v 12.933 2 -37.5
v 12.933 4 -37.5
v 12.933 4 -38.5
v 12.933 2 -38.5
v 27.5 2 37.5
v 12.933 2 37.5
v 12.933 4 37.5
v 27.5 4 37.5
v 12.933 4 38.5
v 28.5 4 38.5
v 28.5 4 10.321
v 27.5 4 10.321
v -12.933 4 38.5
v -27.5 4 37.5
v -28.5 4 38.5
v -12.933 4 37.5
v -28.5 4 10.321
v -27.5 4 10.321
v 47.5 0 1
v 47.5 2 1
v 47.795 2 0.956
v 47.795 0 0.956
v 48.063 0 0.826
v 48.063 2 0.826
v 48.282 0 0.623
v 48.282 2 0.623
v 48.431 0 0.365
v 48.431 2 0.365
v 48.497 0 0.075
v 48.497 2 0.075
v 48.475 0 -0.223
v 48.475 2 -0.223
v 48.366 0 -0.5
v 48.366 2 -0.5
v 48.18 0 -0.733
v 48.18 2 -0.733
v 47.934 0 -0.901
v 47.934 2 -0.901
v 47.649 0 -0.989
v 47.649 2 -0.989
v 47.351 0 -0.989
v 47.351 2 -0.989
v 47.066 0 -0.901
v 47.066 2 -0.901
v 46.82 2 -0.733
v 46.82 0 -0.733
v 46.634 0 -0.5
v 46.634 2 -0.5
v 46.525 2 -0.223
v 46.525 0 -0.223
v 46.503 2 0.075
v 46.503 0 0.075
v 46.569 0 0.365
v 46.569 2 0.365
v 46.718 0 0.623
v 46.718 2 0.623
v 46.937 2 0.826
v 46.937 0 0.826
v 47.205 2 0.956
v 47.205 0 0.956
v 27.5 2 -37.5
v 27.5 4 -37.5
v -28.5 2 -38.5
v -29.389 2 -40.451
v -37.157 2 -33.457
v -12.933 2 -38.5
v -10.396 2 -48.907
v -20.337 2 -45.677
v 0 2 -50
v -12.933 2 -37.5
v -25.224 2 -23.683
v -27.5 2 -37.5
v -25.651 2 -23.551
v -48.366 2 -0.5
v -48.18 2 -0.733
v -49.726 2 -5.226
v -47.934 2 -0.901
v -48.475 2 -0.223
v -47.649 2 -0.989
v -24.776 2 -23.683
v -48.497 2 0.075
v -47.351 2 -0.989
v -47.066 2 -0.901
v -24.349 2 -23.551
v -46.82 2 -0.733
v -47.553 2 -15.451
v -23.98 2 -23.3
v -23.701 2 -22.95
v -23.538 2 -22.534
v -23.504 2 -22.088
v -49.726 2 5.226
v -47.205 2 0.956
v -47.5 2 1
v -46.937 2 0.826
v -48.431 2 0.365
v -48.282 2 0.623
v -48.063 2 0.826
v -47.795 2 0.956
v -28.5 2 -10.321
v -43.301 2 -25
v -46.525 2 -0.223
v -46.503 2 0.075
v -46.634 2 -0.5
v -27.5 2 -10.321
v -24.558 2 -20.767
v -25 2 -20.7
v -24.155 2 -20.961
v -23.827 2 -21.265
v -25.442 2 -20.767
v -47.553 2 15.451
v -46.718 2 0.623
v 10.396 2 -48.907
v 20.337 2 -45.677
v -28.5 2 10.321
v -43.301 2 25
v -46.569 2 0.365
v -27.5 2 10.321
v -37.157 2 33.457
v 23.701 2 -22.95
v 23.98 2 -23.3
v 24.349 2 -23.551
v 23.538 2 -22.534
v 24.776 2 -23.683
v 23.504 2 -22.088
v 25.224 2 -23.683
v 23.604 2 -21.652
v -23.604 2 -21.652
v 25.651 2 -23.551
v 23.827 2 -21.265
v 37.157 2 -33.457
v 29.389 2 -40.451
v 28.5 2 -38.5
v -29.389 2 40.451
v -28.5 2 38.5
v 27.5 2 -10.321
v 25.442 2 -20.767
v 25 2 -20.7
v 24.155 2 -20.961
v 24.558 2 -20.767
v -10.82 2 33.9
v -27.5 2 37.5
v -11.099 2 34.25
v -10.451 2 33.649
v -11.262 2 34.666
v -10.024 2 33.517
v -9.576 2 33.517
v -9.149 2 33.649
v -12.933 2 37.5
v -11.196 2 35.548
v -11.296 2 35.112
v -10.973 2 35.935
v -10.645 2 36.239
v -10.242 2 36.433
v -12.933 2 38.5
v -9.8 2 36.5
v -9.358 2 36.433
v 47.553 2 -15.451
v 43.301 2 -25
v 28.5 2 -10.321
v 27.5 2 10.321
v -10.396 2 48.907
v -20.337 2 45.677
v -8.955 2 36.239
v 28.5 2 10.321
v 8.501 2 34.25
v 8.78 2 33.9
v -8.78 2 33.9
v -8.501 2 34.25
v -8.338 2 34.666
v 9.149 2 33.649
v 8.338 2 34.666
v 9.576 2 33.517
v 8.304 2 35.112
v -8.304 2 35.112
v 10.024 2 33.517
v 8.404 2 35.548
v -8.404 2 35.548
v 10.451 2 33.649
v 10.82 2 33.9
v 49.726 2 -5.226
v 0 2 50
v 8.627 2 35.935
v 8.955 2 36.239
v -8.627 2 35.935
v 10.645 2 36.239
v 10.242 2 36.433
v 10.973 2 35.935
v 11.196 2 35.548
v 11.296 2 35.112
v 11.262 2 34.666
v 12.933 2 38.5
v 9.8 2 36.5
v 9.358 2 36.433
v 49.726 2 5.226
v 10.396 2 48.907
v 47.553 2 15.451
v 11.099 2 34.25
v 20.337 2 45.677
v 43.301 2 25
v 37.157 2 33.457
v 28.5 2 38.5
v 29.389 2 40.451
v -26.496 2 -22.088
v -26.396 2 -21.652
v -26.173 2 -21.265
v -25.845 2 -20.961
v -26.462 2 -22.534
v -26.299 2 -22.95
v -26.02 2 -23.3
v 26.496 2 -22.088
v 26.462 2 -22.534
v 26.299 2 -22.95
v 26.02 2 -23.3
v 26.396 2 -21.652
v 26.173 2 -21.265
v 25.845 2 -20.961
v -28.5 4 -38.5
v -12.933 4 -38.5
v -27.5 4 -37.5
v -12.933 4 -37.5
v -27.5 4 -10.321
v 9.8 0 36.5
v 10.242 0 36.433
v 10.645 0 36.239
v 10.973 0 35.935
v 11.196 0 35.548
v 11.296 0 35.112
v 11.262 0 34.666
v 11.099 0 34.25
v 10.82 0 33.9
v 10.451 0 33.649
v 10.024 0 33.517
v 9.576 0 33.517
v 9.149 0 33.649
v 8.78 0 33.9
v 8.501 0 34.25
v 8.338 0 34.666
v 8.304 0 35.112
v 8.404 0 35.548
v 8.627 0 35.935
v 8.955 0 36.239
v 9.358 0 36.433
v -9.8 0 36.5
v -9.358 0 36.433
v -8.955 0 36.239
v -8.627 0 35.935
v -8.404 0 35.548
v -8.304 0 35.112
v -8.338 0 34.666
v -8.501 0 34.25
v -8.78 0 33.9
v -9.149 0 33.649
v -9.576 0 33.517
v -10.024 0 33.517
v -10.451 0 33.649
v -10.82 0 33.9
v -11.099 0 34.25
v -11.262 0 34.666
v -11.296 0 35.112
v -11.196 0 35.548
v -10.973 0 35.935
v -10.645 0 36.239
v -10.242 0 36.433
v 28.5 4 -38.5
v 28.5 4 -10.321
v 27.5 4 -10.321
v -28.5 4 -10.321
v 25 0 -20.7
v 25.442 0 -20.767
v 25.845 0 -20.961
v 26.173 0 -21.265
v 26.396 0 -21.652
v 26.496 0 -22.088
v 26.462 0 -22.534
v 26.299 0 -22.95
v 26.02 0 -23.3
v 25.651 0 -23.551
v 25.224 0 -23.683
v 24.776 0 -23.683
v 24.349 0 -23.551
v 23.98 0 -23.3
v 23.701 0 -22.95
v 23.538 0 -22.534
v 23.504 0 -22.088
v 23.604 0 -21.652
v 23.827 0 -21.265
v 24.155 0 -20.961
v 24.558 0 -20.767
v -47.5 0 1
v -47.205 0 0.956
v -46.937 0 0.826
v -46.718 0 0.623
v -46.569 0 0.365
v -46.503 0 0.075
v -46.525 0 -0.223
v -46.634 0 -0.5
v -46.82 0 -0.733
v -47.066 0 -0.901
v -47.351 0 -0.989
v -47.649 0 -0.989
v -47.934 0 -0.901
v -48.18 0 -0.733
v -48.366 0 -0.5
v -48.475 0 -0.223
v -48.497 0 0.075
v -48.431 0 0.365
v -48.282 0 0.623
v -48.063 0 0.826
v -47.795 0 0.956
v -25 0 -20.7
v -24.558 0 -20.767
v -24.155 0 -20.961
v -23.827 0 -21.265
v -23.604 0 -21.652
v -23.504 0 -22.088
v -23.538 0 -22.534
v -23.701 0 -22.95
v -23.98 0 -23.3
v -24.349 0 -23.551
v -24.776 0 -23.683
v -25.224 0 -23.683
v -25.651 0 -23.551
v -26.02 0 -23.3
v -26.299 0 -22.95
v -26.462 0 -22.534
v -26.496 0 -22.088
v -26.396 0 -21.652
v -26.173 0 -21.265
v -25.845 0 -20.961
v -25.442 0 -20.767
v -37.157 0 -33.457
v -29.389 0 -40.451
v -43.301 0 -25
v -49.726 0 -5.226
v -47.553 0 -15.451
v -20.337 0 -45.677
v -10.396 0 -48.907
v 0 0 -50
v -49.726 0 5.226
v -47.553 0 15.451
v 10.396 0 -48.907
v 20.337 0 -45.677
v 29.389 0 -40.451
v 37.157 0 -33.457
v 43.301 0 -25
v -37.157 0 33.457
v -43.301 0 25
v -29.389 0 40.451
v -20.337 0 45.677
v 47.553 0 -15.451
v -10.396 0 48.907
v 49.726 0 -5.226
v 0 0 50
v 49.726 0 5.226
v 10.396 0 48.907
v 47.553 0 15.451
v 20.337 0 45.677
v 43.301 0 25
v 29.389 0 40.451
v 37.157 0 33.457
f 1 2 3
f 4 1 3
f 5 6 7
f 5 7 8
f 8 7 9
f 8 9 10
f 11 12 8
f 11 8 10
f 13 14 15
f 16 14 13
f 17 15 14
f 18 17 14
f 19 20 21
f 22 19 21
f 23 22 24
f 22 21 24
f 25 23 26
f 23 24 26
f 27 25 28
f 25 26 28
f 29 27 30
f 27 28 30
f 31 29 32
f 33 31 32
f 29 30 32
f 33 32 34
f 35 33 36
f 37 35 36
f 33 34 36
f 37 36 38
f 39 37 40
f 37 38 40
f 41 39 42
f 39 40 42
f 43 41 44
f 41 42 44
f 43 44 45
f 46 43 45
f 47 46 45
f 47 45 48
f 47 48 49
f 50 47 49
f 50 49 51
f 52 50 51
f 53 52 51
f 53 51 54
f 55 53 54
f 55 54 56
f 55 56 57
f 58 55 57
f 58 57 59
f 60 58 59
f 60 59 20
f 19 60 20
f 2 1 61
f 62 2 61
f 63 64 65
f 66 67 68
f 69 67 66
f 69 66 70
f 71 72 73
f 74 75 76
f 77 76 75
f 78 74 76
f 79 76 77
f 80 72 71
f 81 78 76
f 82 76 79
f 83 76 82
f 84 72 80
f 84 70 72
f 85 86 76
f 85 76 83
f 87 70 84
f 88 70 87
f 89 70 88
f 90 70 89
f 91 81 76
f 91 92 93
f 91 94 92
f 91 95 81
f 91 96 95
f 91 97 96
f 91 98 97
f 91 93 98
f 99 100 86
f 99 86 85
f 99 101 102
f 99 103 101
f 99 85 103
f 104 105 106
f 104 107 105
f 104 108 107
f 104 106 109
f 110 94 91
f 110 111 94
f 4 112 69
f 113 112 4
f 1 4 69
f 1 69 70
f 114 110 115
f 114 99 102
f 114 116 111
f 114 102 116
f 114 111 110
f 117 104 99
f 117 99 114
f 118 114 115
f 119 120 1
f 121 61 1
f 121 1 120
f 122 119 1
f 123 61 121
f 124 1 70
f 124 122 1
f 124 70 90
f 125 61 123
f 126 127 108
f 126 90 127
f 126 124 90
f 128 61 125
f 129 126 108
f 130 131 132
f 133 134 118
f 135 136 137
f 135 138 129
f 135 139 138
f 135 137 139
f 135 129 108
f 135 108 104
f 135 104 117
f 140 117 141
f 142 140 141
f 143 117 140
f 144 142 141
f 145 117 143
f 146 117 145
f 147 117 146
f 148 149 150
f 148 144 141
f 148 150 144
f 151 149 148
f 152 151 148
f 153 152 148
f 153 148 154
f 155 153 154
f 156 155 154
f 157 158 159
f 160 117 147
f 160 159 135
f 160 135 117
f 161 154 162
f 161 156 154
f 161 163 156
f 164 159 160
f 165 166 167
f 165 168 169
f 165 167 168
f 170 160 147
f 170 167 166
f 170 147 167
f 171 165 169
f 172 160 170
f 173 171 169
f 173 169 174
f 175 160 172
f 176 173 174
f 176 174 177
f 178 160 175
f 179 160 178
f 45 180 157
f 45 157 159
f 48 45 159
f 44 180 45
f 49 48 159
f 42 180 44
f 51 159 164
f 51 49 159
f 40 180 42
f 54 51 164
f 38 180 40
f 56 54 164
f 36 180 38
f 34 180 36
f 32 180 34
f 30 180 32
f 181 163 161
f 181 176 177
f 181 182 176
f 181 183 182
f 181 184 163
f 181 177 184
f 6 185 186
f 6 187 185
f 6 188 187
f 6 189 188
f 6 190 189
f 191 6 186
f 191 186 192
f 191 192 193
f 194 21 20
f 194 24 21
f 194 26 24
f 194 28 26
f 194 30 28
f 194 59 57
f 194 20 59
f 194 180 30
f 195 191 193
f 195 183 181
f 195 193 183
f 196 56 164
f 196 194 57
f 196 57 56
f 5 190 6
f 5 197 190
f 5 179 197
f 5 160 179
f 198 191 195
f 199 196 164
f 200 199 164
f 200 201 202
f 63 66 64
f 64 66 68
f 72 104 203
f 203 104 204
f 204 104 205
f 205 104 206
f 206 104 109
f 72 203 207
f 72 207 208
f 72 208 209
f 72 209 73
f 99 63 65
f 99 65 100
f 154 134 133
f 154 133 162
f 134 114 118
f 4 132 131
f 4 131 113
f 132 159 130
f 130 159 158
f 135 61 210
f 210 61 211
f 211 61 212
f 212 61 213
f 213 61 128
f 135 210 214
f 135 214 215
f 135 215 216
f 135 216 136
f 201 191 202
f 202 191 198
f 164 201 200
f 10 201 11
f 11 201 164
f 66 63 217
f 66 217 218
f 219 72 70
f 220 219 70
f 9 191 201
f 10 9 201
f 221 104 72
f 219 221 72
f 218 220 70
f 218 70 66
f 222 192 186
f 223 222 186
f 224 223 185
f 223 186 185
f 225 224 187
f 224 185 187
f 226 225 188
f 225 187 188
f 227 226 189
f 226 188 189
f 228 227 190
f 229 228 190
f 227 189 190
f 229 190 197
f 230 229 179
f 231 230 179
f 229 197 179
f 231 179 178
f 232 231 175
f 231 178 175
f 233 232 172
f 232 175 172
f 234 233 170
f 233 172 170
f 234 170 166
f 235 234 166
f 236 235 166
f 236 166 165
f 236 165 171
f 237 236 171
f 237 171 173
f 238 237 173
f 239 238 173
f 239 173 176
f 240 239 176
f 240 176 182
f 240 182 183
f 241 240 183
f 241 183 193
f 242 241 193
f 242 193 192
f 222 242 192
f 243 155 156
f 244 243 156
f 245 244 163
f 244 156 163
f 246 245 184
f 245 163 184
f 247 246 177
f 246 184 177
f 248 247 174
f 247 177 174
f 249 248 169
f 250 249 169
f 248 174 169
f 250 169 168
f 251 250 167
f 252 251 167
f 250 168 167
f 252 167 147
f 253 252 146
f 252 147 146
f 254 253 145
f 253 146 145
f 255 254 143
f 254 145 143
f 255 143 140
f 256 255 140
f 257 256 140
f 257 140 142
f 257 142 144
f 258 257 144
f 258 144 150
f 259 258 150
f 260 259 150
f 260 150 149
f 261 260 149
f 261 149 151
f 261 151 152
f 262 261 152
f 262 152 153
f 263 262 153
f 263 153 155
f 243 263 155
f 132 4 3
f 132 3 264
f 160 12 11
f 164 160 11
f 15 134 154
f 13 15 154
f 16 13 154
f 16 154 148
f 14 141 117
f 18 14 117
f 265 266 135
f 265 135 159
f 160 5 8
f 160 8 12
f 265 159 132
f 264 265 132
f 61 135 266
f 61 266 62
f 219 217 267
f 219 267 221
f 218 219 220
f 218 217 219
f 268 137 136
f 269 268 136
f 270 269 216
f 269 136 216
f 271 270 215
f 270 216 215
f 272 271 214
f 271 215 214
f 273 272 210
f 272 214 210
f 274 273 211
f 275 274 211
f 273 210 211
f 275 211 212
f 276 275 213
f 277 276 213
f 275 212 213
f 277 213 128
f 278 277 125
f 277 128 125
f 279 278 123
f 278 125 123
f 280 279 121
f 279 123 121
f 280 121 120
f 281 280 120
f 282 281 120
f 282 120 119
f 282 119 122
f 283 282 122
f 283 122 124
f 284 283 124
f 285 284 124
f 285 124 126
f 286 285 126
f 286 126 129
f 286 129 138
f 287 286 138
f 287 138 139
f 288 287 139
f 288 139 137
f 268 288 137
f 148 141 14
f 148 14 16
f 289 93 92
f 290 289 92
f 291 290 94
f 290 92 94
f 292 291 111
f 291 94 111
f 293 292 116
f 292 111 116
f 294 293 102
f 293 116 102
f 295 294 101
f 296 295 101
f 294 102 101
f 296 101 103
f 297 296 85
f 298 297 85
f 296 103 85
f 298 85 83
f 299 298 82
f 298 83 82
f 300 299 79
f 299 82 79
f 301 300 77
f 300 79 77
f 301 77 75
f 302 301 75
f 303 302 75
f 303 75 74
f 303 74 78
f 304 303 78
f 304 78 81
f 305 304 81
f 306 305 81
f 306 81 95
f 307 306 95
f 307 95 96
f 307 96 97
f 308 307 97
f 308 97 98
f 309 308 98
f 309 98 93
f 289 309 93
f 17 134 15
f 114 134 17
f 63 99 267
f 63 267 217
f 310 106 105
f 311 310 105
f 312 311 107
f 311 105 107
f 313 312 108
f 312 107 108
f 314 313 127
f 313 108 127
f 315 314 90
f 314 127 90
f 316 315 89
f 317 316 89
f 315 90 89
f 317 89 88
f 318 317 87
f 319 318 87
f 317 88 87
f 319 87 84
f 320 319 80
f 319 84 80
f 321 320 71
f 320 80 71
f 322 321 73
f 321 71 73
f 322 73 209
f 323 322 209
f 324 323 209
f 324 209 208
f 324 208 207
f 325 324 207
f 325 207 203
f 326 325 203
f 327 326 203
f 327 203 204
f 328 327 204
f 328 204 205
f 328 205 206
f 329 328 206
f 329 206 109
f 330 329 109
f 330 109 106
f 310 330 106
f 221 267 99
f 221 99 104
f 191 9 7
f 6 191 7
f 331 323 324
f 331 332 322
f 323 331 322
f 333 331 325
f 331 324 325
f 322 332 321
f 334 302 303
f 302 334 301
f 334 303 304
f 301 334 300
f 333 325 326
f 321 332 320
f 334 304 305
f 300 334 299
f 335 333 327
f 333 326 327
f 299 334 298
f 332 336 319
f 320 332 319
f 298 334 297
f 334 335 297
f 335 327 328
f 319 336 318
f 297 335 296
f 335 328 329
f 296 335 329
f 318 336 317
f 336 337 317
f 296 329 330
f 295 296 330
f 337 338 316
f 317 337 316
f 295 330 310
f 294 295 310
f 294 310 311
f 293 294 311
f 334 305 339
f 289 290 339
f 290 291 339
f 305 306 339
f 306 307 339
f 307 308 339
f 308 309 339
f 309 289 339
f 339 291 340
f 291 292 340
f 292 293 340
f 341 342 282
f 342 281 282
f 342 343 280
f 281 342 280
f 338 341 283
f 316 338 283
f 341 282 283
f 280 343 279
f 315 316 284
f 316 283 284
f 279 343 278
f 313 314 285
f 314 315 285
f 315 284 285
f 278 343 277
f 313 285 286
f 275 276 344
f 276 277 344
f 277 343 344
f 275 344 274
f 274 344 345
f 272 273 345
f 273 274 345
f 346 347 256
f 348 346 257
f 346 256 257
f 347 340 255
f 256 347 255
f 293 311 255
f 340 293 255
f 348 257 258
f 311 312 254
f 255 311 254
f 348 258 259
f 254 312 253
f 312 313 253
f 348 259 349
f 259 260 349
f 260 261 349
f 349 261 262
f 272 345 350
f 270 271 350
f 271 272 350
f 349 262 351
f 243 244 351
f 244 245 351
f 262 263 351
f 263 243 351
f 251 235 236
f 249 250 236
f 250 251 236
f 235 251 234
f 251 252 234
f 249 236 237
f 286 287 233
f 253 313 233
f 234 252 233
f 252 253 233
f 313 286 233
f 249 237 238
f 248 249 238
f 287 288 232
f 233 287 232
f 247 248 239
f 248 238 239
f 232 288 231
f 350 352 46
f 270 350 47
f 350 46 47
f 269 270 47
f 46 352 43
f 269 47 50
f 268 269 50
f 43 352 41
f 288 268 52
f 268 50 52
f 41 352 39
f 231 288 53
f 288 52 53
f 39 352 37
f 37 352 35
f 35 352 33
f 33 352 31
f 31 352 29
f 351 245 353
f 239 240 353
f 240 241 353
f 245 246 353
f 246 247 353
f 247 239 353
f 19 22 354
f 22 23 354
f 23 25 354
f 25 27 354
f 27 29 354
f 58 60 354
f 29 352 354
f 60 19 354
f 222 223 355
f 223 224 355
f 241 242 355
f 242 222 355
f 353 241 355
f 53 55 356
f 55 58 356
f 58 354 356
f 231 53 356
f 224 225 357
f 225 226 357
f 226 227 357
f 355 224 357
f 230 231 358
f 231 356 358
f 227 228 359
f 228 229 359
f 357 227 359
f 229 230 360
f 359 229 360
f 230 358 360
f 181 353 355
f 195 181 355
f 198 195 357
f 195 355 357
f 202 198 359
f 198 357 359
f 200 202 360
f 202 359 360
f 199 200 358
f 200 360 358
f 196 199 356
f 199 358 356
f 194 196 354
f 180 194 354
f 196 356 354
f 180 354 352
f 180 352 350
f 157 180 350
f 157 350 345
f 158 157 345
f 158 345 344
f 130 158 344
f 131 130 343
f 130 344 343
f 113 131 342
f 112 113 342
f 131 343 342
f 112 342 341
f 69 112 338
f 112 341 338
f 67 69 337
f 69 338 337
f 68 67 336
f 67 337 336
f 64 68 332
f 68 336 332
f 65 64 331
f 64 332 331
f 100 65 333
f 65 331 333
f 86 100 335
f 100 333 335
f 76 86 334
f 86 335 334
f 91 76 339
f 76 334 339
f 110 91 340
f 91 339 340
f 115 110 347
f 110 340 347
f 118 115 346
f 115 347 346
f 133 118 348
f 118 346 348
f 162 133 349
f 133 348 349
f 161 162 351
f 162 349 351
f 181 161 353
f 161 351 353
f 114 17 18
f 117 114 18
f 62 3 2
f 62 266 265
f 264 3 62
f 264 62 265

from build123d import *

# Parameters (mm, degrees)
SKETCH1_R           = 50
BOSS_EXTRUDE3_DEPTH = 2
SKETCH3_W           = 57
SKETCH3_H           = 77
SKETCH3_W_2         = 55
SKETCH3_H_2         = 75
BOSS_EXTRUDE4_DEPTH = 2
SKETCH4_W           = 84.733719196
SKETCH4_H           = 20.64189851
CUT_EXTRUDE1_DEPTH  = 2
SKETCH5_W           = 25.866082702
SKETCH5_H           = 94.035315438
CUT_EXTRUDE2_DEPTH  = 2
SKETCH6_R           = 1.5
CUT_EXTRUDE3_DEPTH  = 12
SKETCH7_R           = 1
CUT_EXTRUDE4_DEPTH  = 10.15


with BuildPart() as part:
    # Sketch1 → Boss-Extrude3 (new body)
    with BuildSketch(Plane(origin=(0, 0, 0), x_dir=(1, 0, 0), z_dir=(0, 1, 0))):
        with Locations(Location((0, 0, 0), (0, 0, 270))):
            Circle(SKETCH1_R)
    extrude(amount=BOSS_EXTRUDE3_DEPTH)

    # Sketch3 → Boss-Extrude4 (add)
    with BuildSketch(Plane(origin=(0, 2, 0), x_dir=(1, 0, 0), z_dir=(0, 1, 0))):
        Rectangle(SKETCH3_W, SKETCH3_H)
        Rectangle(SKETCH3_W_2, SKETCH3_H_2, mode=Mode.SUBTRACT)
    extrude(amount=BOSS_EXTRUDE4_DEPTH)

    # Sketch4 → Cut-Extrude1 (cut)
    with BuildSketch(Plane(origin=(0, 4, 0), x_dir=(1, 0, 0), z_dir=(0, 1, 0))):
        Rectangle(SKETCH4_W, SKETCH4_H)
    extrude(amount=-CUT_EXTRUDE1_DEPTH, mode=Mode.SUBTRACT)

    # Sketch5 → Cut-Extrude2 (cut)
    with BuildSketch(Plane(origin=(0, 4, 0), x_dir=(1, 0, 0), z_dir=(0, 1, 0))):
        Rectangle(SKETCH5_W, SKETCH5_H)
    extrude(amount=-CUT_EXTRUDE2_DEPTH, mode=Mode.SUBTRACT)

    # Sketch6 → Cut-Extrude3 (cut)
    with BuildSketch(Plane(origin=(0, 2, 0), x_dir=(1, 0, 0), z_dir=(0, 1, 0))):
        with Locations(Location((25, 22.2, 0), (0, 0, 270))):
            Circle(SKETCH6_R)
        with Locations(Location((-25, 22.2, 0), (0, 0, 270))):
            Circle(SKETCH6_R)
        with Locations(Location((9.8, -35, 0), (0, 0, 270))):
            Circle(SKETCH6_R)
        with Locations(Location((-9.8, -35, 0), (0, 0, 270))):
            Circle(SKETCH6_R)
    extrude(amount=-CUT_EXTRUDE3_DEPTH, mode=Mode.SUBTRACT)

    # Sketch7 → Cut-Extrude4 (cut)
    with BuildSketch(Plane(origin=(0, 2, 0), x_dir=(1, 0, 0), z_dir=(0, 1, 0))):
        with Locations(Location((-47.5, 0, 0), (0, 0, 270))):
            Circle(SKETCH7_R)
        with Locations(Location((47.5, 0, 0), (0, 0, 270))):
            Circle(SKETCH7_R)
    extrude(amount=-CUT_EXTRUDE4_DEPTH, mode=Mode.SUBTRACT)


solid = part.part
